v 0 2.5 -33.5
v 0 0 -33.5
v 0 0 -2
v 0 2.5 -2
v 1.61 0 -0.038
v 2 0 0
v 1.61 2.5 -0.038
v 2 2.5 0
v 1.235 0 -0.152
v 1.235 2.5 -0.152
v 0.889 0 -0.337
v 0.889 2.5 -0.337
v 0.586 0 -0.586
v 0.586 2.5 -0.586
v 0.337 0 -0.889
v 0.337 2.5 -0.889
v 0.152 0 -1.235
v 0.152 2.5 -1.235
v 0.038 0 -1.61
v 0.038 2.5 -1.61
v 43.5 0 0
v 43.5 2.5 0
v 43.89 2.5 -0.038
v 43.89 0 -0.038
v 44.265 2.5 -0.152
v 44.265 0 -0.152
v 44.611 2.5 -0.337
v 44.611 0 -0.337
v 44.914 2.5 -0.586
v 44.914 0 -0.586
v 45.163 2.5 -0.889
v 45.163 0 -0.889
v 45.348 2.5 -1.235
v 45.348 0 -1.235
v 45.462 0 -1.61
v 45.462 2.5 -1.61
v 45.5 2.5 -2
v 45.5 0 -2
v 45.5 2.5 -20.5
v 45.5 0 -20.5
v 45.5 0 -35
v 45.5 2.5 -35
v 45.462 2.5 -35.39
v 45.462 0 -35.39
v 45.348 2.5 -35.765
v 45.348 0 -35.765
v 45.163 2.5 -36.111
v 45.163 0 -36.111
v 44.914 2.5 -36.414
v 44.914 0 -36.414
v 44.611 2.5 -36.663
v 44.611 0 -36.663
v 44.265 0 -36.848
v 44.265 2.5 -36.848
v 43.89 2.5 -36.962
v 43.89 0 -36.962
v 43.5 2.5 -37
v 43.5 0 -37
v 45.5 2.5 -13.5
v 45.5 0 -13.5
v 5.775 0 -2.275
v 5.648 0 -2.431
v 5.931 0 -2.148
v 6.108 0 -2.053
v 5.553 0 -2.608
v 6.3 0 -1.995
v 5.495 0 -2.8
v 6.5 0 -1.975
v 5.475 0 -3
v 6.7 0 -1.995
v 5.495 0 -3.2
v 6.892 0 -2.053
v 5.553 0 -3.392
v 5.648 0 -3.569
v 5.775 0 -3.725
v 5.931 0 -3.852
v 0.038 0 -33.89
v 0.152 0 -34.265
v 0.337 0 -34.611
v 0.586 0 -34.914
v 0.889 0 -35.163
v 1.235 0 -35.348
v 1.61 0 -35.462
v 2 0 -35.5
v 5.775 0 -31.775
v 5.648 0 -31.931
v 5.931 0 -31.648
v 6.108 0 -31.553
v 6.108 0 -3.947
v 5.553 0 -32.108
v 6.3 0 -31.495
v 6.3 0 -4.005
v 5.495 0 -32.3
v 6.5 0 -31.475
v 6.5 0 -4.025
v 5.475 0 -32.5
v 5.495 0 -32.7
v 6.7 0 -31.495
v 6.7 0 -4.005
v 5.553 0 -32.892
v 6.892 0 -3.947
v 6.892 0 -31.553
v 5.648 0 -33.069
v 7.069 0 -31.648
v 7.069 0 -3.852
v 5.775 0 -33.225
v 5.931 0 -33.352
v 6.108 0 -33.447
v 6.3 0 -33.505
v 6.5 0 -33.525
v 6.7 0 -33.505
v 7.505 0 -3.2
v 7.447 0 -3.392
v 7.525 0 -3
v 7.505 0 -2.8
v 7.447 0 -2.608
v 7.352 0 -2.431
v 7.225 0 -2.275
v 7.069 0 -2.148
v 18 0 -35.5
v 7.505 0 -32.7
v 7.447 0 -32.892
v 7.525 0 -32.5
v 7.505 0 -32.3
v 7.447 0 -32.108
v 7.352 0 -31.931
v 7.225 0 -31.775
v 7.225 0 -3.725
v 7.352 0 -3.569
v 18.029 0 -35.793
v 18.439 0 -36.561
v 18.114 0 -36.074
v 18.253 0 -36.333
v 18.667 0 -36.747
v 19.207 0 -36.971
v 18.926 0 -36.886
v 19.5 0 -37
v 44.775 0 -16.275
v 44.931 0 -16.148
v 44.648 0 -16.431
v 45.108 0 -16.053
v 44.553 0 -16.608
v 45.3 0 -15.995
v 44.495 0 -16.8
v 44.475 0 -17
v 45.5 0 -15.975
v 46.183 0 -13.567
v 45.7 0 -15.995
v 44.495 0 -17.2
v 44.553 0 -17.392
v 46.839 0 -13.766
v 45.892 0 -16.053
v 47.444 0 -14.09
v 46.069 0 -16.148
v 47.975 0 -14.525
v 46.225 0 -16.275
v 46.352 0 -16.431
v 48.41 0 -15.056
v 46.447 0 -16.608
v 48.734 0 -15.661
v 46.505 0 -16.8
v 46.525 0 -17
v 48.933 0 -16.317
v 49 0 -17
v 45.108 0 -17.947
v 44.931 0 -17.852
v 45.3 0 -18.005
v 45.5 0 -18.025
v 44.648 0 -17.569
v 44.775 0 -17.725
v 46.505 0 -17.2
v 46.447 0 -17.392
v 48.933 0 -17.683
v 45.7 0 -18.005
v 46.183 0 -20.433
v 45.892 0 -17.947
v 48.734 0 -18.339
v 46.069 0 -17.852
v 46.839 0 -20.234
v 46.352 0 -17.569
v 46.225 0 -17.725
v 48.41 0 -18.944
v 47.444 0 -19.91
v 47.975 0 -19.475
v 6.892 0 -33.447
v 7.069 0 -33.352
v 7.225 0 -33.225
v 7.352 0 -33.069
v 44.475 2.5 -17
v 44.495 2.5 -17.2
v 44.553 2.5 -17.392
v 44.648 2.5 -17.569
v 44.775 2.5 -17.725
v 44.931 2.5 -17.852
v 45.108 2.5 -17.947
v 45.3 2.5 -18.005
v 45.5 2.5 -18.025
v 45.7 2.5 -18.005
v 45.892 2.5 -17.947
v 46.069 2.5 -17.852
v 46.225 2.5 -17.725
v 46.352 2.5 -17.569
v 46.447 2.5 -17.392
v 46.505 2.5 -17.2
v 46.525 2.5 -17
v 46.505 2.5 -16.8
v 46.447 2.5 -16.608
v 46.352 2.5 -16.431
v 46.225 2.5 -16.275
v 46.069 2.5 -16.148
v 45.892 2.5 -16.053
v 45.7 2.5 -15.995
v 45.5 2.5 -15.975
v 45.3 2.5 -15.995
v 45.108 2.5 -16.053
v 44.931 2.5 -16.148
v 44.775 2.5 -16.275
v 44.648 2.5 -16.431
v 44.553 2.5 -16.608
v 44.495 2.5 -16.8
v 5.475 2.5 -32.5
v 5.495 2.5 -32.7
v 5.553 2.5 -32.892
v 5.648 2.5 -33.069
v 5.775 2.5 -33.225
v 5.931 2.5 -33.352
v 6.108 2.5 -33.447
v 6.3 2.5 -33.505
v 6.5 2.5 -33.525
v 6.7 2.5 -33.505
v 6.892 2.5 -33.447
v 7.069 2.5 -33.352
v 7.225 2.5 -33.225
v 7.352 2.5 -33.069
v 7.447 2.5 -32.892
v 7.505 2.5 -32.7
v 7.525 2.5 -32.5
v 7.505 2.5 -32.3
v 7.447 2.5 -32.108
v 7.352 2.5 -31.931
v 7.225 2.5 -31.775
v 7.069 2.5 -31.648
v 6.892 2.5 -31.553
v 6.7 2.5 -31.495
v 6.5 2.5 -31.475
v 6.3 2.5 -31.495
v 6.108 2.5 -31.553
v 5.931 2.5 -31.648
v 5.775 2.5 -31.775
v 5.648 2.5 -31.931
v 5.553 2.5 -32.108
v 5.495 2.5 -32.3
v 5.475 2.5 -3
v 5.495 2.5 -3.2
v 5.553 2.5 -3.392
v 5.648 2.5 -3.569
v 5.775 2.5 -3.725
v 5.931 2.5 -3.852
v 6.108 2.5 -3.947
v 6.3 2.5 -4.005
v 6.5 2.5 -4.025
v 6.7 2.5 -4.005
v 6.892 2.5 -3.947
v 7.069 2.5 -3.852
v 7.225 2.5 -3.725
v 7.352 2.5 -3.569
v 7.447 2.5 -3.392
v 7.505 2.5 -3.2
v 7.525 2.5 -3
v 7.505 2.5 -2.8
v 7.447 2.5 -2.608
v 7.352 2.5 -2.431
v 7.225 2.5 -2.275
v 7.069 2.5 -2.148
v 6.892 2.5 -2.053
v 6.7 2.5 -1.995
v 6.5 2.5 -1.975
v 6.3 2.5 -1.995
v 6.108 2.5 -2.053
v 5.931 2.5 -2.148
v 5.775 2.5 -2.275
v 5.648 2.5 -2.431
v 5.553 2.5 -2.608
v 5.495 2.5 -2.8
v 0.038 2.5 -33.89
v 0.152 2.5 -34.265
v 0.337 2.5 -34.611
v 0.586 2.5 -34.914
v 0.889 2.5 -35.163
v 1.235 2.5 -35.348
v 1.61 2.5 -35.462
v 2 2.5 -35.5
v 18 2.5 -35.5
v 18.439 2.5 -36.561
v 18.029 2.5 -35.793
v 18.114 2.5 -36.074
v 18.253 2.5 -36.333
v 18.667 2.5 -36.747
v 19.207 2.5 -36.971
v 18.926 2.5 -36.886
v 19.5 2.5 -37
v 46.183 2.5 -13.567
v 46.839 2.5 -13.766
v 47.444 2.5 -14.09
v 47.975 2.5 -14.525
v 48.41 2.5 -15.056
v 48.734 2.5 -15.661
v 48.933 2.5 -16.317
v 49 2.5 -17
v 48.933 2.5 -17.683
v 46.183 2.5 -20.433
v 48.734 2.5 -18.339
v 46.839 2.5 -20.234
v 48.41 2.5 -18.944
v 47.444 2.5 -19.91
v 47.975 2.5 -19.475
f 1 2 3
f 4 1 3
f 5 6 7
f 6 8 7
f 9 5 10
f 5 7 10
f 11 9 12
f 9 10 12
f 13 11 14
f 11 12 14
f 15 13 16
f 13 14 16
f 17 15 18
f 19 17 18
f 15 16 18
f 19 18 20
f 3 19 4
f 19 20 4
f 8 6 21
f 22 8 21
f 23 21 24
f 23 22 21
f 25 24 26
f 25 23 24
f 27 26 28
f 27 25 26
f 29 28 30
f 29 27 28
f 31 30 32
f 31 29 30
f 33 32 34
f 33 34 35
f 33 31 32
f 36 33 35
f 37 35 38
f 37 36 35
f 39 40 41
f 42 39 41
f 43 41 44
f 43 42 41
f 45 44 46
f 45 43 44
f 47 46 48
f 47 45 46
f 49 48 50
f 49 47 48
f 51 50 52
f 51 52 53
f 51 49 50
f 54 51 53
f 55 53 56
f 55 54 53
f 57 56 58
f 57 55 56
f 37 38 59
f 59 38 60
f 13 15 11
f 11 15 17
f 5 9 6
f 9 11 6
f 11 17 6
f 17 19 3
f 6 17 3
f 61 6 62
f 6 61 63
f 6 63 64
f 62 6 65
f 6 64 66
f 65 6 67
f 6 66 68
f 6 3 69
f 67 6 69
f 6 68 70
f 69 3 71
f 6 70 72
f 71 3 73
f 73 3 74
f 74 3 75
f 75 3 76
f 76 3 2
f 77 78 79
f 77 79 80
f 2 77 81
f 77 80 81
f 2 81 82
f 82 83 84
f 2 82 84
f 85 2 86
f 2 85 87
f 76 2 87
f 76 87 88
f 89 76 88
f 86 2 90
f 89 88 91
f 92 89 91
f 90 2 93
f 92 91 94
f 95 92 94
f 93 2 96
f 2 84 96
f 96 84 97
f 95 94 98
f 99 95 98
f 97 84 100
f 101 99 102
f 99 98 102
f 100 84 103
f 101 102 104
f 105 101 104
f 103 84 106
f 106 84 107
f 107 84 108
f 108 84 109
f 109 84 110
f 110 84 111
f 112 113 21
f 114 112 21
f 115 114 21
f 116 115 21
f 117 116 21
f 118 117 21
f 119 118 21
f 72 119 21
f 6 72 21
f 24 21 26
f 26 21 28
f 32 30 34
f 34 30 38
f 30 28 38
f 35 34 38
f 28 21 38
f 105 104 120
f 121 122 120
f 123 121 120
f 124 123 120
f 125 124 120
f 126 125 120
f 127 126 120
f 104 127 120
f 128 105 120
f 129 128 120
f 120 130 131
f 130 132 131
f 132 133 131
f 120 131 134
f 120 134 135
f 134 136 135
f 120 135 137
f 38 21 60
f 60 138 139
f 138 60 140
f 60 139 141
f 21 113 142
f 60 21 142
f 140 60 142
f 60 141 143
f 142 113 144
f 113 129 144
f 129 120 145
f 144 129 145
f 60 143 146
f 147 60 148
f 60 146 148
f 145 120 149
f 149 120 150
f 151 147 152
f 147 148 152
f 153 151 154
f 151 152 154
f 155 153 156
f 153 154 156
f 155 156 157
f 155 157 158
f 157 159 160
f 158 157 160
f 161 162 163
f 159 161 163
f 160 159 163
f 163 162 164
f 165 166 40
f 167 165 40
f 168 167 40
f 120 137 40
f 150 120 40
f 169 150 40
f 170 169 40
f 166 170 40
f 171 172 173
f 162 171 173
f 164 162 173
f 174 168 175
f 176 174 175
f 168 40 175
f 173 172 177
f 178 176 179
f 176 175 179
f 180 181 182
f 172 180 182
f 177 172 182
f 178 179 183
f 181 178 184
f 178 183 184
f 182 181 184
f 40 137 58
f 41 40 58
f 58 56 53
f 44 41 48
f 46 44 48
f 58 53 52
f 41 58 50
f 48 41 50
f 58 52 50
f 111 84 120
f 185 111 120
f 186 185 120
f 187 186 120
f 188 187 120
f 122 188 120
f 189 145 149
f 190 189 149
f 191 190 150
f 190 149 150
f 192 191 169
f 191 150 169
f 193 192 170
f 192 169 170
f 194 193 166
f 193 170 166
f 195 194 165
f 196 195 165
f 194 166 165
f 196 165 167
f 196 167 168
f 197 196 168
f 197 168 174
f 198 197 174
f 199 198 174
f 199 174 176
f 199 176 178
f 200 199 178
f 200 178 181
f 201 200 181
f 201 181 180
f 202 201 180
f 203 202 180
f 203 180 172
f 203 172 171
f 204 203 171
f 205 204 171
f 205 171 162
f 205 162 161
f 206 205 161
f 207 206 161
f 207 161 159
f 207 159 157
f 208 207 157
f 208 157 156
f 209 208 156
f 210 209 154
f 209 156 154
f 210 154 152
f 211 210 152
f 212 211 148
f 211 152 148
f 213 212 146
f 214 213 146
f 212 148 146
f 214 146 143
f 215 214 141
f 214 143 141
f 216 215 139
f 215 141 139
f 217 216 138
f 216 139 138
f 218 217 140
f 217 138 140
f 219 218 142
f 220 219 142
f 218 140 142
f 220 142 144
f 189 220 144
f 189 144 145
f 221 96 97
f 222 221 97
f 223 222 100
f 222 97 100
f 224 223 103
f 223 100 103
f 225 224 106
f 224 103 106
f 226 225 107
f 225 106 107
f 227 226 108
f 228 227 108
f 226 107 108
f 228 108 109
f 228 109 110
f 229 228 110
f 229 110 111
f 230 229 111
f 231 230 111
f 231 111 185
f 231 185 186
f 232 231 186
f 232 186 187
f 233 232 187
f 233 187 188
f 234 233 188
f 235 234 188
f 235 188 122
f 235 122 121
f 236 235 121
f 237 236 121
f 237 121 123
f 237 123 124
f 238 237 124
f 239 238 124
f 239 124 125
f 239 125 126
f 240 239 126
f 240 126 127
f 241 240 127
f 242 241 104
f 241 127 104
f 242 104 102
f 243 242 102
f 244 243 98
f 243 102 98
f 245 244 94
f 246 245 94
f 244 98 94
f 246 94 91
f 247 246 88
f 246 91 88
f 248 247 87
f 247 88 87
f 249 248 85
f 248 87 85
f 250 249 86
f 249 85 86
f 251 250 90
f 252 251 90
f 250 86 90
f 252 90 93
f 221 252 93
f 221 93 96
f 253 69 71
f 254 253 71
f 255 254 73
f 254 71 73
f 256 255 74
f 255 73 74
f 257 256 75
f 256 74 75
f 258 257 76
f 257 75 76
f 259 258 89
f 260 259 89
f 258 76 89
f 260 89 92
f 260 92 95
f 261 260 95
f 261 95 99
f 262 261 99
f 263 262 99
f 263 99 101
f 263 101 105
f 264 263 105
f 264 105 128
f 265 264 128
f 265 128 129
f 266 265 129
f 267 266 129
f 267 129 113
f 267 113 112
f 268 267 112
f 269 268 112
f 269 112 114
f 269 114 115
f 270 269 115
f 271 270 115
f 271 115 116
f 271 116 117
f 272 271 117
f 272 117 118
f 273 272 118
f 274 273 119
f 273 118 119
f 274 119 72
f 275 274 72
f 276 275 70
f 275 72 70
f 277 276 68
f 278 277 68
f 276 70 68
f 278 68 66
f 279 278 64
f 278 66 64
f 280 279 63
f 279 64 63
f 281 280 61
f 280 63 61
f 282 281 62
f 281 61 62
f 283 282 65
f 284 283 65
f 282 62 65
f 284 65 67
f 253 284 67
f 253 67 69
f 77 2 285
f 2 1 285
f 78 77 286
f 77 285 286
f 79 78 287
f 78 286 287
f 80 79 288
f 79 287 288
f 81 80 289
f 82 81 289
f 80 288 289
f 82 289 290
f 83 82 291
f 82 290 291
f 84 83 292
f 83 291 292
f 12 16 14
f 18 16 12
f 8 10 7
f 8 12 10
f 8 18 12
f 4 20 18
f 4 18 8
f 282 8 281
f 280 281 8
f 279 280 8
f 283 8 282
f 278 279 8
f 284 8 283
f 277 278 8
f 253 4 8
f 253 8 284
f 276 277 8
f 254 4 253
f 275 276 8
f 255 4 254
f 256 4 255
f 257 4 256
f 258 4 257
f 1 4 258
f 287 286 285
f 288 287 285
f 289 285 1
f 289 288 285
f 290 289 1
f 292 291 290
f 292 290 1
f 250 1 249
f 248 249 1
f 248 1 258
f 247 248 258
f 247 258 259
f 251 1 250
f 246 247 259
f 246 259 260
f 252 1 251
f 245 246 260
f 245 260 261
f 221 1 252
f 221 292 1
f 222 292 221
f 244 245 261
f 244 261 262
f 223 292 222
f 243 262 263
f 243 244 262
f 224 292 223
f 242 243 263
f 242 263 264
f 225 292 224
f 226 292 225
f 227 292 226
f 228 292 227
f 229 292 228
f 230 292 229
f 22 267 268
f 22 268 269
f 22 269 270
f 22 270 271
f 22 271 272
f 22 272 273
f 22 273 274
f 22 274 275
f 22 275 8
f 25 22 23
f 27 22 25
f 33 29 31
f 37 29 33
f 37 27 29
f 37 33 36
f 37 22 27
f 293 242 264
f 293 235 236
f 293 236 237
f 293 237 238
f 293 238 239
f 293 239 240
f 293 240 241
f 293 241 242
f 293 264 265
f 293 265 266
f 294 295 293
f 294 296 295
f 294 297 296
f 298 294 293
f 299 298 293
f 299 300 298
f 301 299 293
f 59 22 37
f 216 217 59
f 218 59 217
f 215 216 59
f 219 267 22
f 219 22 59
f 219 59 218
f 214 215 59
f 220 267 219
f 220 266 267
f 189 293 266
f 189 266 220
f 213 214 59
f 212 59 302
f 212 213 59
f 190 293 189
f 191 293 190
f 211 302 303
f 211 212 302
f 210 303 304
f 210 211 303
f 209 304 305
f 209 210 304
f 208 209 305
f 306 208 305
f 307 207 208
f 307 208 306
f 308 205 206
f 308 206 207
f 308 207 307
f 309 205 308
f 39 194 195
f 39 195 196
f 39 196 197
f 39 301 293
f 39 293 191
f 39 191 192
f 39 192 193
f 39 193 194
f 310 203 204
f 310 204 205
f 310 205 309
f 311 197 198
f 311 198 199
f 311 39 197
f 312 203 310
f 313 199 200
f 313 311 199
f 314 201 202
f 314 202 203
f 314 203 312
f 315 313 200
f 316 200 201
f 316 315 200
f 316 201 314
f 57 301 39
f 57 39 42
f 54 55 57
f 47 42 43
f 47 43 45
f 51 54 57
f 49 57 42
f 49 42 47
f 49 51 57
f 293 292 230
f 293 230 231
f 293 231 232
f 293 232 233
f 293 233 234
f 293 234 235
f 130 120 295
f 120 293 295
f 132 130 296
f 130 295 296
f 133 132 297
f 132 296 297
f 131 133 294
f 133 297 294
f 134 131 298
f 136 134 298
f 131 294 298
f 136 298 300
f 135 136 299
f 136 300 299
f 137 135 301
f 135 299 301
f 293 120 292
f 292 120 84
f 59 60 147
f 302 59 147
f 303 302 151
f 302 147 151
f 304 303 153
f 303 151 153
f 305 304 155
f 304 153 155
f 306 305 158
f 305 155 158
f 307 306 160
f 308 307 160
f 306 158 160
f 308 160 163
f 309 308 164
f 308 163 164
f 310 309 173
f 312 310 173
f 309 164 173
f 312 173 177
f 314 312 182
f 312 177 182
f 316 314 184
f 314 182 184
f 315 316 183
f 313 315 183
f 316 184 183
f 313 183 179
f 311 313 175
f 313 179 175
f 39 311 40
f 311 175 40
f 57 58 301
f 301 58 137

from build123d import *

# Parameters (mm, degrees)
SKETCH1_R                = 0.5
BOSS_EXTRUDE1_DEPTH      = 2.5
FILLET1_R                = 2
FILLET2_R                = 1.5
M2_5X0_45_TAPPED_HOLE1_D = 2.05


with BuildPart() as part:
    # Sketch1 → Boss-Extrude1 (new body)
    with BuildSketch(Plane(origin=(0, 0, 0), x_dir=(1, 0, 0), z_dir=(0, 1, 0))):
        with BuildLine():
            Line((0, 0), (45.5, 0))
            Line((45.5, 0), (45.5, 13.5))
            ThreePointArc((45.5, 13.5), (49, 17), (45.5, 20.5))
            Line((45.5, 20.5), (45.5, 37))
            Line((45.5, 37), (18, 37))
            Line((18, 37), (18, 35.5))
            Line((18, 35.5), (0, 35.5))
            Line((0, 35.5), (0, 0))
        make_face()
        with Locations(Location((45.5, 17, 0), (0, 0, 270))):
            Circle(SKETCH1_R, mode=Mode.SUBTRACT)
        with Locations(Location((6.5, 3, 0), (0, 0, 270))):
            Circle(SKETCH1_R, mode=Mode.SUBTRACT)
        with Locations(Location((6.5, 32.5, 0), (0, 0, 270))):
            Circle(SKETCH1_R, mode=Mode.SUBTRACT)
    extrude(amount=BOSS_EXTRUDE1_DEPTH)

    # Fillet1
    fillet1_edges = [part.edges().sort_by_distance(p)[0] for p in [
        (0, 1.25, -35.5),
        (45.5, 1.25, -37),
        (45.5, 1.25, 0),
        (0, 1.25, 0),
    ]]
    fillet(fillet1_edges, radius=FILLET1_R)

    # Fillet2
    fillet2_edges = [part.edges().sort_by_distance(p)[0] for p in [
        (18, 1.25, -37),
    ]]
    fillet(fillet2_edges, radius=FILLET2_R - 0.0001)  # a hair under: the kernel refuses the full size

    # M2.5x0.45 Tapped Hole1 (through all)
    with Locations(Plane(origin=(0, 2.5, 0), x_dir=(1, 0, 0), z_dir=(0, 1, 0))):
        with Locations((6.5, 32.5), (6.5, 3), (45.5, 17)):
            Hole(M2_5X0_45_TAPPED_HOLE1_D / 2)


solid = part.part
